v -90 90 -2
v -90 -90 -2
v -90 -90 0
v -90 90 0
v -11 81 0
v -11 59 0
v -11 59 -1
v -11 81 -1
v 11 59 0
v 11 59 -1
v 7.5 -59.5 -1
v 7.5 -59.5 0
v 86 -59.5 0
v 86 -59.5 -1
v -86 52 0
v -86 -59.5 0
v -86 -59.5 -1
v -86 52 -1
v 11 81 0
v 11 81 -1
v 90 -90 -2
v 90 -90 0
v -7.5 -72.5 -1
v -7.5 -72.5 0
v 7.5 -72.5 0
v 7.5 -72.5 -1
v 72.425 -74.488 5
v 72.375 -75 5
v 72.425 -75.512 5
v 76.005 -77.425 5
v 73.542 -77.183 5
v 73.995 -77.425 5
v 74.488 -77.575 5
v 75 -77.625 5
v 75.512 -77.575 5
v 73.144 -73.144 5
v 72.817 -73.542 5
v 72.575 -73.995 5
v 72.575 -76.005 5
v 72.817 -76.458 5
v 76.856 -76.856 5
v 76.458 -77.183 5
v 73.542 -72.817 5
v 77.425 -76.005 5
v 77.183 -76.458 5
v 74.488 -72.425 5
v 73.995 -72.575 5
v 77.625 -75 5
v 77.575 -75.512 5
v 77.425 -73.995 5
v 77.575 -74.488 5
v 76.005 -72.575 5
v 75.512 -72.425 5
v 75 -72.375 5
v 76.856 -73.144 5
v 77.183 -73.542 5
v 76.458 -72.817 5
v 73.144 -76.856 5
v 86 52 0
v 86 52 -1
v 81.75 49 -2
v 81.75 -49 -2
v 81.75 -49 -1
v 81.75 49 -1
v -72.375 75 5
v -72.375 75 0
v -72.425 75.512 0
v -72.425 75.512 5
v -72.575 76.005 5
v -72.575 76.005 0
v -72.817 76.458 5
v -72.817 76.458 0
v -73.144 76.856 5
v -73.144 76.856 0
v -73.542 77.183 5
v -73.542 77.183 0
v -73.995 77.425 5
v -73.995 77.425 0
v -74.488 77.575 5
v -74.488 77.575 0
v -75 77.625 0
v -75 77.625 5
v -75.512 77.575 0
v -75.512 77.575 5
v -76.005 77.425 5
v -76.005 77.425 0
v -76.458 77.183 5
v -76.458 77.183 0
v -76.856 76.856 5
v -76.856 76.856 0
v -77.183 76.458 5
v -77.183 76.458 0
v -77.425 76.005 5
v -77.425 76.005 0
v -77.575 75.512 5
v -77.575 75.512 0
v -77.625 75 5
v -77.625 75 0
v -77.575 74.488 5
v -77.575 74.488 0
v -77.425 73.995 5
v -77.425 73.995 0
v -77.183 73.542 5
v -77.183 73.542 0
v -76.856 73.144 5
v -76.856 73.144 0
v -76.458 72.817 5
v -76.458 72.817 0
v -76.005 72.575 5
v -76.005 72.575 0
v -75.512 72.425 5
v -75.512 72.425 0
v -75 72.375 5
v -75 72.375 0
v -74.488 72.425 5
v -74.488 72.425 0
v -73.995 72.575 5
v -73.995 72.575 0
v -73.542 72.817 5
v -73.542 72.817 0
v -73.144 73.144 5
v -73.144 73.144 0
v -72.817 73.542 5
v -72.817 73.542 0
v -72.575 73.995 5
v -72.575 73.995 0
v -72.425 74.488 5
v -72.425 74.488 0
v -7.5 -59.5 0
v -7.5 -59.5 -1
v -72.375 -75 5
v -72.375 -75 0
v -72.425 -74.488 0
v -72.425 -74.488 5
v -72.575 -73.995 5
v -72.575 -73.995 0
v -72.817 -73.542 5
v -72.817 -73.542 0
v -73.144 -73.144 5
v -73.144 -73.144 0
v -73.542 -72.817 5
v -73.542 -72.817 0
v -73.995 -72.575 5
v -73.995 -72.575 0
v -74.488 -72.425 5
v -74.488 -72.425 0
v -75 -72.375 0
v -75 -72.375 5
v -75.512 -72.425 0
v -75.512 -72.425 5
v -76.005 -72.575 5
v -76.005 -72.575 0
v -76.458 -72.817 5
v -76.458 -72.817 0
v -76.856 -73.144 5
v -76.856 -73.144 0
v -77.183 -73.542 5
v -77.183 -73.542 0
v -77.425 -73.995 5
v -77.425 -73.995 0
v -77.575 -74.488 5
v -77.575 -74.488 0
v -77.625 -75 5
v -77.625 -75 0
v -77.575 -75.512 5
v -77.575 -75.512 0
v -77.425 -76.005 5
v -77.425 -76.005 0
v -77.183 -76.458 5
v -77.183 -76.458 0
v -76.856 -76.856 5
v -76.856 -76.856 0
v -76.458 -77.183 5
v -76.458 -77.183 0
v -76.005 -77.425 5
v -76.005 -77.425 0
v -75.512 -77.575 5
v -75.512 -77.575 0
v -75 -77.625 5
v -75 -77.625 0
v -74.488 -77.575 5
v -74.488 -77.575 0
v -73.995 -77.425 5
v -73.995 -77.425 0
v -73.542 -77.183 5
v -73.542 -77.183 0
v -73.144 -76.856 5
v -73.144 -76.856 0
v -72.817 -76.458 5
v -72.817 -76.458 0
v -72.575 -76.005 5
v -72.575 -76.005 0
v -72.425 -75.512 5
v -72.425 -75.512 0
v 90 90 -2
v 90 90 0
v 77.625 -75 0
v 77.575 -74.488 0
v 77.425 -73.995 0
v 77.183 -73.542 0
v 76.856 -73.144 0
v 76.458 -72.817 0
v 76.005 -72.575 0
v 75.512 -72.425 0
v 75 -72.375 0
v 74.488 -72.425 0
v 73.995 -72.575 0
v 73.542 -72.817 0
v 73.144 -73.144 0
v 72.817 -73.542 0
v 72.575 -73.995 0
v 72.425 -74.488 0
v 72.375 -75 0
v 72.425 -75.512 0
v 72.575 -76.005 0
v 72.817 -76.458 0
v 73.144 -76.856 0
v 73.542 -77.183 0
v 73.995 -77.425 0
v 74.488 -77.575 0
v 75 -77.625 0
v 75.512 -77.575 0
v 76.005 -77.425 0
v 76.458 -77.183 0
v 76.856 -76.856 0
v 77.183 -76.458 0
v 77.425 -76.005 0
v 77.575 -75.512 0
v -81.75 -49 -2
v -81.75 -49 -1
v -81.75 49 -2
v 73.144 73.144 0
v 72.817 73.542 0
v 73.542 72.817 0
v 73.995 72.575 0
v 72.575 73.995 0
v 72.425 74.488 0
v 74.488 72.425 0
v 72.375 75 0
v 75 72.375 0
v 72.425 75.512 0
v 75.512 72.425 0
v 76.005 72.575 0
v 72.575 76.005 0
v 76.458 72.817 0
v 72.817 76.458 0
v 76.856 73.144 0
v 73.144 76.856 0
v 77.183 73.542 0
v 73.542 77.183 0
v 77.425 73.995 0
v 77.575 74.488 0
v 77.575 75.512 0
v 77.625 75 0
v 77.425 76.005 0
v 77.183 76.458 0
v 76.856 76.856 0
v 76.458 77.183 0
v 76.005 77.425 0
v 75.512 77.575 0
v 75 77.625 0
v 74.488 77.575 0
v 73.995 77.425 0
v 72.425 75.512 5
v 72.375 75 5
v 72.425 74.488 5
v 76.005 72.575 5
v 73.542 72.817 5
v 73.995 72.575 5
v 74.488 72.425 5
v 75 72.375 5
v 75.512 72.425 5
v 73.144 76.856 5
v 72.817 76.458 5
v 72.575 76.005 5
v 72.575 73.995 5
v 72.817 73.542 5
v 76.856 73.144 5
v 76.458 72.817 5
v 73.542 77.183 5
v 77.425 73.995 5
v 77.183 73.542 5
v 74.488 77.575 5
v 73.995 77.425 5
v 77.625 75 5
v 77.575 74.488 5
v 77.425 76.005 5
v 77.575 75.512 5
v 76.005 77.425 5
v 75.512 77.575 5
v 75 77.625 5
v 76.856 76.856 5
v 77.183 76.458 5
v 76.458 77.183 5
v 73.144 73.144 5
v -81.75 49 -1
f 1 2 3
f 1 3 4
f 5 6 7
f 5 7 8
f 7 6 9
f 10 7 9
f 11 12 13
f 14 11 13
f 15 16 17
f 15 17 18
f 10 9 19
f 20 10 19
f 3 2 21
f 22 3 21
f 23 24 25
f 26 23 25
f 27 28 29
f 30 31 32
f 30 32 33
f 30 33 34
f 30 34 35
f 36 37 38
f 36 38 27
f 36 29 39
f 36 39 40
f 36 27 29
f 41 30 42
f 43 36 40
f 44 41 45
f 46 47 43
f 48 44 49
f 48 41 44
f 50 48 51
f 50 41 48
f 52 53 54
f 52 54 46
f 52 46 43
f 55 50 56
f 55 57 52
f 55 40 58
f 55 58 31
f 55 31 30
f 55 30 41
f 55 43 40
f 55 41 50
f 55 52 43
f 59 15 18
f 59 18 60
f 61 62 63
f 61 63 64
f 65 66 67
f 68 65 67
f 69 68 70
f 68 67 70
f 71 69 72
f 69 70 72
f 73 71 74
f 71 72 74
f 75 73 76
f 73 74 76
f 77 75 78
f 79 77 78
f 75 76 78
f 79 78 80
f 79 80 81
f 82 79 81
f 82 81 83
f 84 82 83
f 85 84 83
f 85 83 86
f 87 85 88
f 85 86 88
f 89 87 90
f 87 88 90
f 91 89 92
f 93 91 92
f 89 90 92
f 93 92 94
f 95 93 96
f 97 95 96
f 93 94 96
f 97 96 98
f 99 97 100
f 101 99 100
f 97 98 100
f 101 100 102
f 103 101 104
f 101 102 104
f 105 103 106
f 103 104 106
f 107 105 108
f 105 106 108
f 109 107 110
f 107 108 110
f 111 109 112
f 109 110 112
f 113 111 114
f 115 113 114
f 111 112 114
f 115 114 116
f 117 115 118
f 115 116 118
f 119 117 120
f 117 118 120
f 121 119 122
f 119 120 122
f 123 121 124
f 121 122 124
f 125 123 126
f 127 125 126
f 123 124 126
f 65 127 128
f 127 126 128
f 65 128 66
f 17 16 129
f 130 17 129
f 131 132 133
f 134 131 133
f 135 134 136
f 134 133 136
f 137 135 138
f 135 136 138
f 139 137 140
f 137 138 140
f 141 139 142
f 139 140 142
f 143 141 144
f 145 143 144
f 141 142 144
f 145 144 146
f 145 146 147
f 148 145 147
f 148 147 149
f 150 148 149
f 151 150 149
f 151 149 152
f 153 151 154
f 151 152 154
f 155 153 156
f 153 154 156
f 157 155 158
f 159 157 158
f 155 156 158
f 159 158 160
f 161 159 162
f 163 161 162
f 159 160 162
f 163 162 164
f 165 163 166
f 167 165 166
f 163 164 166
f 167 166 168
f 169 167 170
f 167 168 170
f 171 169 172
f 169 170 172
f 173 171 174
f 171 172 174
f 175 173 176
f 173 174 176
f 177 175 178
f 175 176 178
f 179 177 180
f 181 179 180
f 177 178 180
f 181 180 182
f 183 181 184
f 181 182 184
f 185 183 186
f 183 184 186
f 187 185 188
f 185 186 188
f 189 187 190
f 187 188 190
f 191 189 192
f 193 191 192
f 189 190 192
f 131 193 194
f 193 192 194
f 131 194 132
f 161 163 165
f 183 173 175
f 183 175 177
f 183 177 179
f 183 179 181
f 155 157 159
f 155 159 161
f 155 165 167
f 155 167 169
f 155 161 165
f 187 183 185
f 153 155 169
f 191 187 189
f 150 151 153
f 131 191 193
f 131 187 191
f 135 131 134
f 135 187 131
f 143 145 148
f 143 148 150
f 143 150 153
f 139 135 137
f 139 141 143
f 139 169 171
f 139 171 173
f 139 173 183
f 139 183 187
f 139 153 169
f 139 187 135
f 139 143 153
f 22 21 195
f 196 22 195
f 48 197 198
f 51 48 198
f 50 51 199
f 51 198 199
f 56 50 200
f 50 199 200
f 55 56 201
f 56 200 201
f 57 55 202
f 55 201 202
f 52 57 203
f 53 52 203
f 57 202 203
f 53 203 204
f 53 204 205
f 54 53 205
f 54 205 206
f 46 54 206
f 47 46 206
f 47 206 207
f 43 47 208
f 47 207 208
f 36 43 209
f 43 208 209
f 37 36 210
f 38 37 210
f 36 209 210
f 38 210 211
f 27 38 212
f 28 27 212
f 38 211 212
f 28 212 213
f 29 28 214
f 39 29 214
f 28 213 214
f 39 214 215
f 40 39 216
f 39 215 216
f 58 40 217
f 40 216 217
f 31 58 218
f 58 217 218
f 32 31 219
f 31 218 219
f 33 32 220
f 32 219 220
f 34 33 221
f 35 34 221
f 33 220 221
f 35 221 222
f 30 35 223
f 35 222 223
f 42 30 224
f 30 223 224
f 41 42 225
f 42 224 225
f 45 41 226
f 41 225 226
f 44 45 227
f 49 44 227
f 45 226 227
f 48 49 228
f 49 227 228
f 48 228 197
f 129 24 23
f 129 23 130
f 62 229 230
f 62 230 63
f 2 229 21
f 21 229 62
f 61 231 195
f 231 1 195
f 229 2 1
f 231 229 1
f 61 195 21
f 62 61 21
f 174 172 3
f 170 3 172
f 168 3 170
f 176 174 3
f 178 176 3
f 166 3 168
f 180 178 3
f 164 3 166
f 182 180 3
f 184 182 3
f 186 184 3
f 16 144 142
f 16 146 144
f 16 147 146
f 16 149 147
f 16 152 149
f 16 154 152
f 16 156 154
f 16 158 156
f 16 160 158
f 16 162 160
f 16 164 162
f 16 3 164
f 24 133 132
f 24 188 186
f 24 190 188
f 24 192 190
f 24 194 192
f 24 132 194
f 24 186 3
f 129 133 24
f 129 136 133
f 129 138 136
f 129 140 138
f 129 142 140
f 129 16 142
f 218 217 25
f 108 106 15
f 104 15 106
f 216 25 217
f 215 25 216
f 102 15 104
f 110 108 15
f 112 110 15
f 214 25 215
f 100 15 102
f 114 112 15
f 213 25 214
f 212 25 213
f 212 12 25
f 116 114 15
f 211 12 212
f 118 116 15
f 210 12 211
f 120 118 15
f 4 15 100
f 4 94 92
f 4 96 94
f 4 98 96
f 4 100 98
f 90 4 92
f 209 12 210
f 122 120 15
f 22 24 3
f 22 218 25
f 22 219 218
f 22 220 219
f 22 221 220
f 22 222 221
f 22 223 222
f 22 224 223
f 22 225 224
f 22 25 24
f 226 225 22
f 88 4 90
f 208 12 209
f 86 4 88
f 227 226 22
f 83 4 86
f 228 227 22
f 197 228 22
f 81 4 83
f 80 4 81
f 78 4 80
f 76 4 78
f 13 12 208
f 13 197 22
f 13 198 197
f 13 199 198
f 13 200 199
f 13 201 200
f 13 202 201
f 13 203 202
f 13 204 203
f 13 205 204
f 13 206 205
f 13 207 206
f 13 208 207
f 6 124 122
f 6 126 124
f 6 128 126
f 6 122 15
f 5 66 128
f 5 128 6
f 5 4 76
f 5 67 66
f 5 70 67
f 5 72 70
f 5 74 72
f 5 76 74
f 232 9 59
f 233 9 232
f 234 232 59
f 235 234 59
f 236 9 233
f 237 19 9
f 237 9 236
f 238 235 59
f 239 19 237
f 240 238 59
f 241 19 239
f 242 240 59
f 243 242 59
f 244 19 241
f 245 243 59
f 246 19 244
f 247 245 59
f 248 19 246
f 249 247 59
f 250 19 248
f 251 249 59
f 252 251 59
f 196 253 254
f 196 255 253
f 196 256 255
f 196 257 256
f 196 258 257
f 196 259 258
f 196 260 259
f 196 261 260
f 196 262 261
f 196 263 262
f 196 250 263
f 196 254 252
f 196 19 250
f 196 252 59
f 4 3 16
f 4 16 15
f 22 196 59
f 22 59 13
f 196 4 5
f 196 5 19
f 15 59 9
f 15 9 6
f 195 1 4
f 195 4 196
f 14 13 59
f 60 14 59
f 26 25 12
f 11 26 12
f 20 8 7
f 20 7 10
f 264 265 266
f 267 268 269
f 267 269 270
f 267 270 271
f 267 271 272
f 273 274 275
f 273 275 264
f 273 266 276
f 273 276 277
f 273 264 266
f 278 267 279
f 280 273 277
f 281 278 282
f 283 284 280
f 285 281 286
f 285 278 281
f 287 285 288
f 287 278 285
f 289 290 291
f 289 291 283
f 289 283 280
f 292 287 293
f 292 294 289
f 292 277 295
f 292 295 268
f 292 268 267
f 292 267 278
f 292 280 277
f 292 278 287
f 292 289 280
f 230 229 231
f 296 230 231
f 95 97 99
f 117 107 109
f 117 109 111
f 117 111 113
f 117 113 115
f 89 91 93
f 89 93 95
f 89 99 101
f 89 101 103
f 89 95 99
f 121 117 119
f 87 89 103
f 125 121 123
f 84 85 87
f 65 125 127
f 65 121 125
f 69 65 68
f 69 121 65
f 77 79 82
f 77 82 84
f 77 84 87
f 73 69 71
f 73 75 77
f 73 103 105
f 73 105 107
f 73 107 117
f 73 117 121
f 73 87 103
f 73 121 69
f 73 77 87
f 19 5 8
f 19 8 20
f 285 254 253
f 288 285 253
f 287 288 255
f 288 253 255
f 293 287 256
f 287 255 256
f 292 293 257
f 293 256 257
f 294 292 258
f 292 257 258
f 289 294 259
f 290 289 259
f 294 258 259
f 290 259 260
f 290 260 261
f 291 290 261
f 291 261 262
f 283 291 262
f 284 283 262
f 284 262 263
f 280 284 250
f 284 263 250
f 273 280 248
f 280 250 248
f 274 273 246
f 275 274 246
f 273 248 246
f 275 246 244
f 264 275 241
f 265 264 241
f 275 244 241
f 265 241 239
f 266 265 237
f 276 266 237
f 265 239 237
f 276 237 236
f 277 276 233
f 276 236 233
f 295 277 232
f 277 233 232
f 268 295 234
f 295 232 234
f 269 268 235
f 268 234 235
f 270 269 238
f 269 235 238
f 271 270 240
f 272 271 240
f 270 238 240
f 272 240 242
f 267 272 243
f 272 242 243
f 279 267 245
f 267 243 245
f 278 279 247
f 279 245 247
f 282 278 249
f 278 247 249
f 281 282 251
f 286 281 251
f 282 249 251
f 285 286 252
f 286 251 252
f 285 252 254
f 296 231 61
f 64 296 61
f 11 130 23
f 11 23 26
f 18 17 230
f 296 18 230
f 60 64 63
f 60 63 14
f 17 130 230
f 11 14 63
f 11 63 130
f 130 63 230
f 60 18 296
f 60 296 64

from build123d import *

# Parameters (mm, degrees)
SKETCH_W        = 180
SKETCH_H        = 180
SKETCH_W_2      = 163.5
SKETCH_H_2      = 98
PAD_DEPTH       = 2
SKETCH003_W     = 172
SKETCH003_H     = 111.5
POCKET001_DEPTH = 1
SKETCH002_W     = 22
SKETCH002_H     = 22
SKETCH002_W_2   = 15
SKETCH002_H_2   = 15
POCKET_DEPTH    = 1
SKETCH001_R     = 2.625
PAD001_DEPTH    = 5


with BuildPart() as part:
    # Sketch (on DatumPlane) → Pad (new body)
    with BuildSketch(Plane.XY.offset(-2)):
        Rectangle(SKETCH_W, SKETCH_H)
        Rectangle(SKETCH_W_2, SKETCH_H_2, mode=Mode.SUBTRACT)
    extrude(amount=PAD_DEPTH)

    # Sketch003 (on DatumPlane) → Pocket001 (cut)
    with BuildSketch(Plane.XY):
        with Locations((0, -3.75)):
            Rectangle(SKETCH003_W, SKETCH003_H)
    extrude(amount=-POCKET001_DEPTH, mode=Mode.SUBTRACT)

    # Sketch002 (on DatumPlane) → Pocket (cut)
    with BuildSketch(Plane.XY):
        with Locations((0, 70)):
            Rectangle(SKETCH002_W, SKETCH002_H)
        with Locations((0, -65)):
            Rectangle(SKETCH002_W_2, SKETCH002_H_2)
    extrude(amount=-POCKET_DEPTH, mode=Mode.SUBTRACT)

    # Sketch001 (on DatumPlane) → Pad001 (join)
    with BuildSketch(Plane.XY):
        with Locations((75, 75)):
            Circle(SKETCH001_R)
        with Locations((-75, 75)):
            Circle(SKETCH001_R)
        with Locations((-75, -75)):
            Circle(SKETCH001_R)
        with Locations((75, -75)):
            Circle(SKETCH001_R)
    extrude(amount=PAD001_DEPTH)


solid = part.part
